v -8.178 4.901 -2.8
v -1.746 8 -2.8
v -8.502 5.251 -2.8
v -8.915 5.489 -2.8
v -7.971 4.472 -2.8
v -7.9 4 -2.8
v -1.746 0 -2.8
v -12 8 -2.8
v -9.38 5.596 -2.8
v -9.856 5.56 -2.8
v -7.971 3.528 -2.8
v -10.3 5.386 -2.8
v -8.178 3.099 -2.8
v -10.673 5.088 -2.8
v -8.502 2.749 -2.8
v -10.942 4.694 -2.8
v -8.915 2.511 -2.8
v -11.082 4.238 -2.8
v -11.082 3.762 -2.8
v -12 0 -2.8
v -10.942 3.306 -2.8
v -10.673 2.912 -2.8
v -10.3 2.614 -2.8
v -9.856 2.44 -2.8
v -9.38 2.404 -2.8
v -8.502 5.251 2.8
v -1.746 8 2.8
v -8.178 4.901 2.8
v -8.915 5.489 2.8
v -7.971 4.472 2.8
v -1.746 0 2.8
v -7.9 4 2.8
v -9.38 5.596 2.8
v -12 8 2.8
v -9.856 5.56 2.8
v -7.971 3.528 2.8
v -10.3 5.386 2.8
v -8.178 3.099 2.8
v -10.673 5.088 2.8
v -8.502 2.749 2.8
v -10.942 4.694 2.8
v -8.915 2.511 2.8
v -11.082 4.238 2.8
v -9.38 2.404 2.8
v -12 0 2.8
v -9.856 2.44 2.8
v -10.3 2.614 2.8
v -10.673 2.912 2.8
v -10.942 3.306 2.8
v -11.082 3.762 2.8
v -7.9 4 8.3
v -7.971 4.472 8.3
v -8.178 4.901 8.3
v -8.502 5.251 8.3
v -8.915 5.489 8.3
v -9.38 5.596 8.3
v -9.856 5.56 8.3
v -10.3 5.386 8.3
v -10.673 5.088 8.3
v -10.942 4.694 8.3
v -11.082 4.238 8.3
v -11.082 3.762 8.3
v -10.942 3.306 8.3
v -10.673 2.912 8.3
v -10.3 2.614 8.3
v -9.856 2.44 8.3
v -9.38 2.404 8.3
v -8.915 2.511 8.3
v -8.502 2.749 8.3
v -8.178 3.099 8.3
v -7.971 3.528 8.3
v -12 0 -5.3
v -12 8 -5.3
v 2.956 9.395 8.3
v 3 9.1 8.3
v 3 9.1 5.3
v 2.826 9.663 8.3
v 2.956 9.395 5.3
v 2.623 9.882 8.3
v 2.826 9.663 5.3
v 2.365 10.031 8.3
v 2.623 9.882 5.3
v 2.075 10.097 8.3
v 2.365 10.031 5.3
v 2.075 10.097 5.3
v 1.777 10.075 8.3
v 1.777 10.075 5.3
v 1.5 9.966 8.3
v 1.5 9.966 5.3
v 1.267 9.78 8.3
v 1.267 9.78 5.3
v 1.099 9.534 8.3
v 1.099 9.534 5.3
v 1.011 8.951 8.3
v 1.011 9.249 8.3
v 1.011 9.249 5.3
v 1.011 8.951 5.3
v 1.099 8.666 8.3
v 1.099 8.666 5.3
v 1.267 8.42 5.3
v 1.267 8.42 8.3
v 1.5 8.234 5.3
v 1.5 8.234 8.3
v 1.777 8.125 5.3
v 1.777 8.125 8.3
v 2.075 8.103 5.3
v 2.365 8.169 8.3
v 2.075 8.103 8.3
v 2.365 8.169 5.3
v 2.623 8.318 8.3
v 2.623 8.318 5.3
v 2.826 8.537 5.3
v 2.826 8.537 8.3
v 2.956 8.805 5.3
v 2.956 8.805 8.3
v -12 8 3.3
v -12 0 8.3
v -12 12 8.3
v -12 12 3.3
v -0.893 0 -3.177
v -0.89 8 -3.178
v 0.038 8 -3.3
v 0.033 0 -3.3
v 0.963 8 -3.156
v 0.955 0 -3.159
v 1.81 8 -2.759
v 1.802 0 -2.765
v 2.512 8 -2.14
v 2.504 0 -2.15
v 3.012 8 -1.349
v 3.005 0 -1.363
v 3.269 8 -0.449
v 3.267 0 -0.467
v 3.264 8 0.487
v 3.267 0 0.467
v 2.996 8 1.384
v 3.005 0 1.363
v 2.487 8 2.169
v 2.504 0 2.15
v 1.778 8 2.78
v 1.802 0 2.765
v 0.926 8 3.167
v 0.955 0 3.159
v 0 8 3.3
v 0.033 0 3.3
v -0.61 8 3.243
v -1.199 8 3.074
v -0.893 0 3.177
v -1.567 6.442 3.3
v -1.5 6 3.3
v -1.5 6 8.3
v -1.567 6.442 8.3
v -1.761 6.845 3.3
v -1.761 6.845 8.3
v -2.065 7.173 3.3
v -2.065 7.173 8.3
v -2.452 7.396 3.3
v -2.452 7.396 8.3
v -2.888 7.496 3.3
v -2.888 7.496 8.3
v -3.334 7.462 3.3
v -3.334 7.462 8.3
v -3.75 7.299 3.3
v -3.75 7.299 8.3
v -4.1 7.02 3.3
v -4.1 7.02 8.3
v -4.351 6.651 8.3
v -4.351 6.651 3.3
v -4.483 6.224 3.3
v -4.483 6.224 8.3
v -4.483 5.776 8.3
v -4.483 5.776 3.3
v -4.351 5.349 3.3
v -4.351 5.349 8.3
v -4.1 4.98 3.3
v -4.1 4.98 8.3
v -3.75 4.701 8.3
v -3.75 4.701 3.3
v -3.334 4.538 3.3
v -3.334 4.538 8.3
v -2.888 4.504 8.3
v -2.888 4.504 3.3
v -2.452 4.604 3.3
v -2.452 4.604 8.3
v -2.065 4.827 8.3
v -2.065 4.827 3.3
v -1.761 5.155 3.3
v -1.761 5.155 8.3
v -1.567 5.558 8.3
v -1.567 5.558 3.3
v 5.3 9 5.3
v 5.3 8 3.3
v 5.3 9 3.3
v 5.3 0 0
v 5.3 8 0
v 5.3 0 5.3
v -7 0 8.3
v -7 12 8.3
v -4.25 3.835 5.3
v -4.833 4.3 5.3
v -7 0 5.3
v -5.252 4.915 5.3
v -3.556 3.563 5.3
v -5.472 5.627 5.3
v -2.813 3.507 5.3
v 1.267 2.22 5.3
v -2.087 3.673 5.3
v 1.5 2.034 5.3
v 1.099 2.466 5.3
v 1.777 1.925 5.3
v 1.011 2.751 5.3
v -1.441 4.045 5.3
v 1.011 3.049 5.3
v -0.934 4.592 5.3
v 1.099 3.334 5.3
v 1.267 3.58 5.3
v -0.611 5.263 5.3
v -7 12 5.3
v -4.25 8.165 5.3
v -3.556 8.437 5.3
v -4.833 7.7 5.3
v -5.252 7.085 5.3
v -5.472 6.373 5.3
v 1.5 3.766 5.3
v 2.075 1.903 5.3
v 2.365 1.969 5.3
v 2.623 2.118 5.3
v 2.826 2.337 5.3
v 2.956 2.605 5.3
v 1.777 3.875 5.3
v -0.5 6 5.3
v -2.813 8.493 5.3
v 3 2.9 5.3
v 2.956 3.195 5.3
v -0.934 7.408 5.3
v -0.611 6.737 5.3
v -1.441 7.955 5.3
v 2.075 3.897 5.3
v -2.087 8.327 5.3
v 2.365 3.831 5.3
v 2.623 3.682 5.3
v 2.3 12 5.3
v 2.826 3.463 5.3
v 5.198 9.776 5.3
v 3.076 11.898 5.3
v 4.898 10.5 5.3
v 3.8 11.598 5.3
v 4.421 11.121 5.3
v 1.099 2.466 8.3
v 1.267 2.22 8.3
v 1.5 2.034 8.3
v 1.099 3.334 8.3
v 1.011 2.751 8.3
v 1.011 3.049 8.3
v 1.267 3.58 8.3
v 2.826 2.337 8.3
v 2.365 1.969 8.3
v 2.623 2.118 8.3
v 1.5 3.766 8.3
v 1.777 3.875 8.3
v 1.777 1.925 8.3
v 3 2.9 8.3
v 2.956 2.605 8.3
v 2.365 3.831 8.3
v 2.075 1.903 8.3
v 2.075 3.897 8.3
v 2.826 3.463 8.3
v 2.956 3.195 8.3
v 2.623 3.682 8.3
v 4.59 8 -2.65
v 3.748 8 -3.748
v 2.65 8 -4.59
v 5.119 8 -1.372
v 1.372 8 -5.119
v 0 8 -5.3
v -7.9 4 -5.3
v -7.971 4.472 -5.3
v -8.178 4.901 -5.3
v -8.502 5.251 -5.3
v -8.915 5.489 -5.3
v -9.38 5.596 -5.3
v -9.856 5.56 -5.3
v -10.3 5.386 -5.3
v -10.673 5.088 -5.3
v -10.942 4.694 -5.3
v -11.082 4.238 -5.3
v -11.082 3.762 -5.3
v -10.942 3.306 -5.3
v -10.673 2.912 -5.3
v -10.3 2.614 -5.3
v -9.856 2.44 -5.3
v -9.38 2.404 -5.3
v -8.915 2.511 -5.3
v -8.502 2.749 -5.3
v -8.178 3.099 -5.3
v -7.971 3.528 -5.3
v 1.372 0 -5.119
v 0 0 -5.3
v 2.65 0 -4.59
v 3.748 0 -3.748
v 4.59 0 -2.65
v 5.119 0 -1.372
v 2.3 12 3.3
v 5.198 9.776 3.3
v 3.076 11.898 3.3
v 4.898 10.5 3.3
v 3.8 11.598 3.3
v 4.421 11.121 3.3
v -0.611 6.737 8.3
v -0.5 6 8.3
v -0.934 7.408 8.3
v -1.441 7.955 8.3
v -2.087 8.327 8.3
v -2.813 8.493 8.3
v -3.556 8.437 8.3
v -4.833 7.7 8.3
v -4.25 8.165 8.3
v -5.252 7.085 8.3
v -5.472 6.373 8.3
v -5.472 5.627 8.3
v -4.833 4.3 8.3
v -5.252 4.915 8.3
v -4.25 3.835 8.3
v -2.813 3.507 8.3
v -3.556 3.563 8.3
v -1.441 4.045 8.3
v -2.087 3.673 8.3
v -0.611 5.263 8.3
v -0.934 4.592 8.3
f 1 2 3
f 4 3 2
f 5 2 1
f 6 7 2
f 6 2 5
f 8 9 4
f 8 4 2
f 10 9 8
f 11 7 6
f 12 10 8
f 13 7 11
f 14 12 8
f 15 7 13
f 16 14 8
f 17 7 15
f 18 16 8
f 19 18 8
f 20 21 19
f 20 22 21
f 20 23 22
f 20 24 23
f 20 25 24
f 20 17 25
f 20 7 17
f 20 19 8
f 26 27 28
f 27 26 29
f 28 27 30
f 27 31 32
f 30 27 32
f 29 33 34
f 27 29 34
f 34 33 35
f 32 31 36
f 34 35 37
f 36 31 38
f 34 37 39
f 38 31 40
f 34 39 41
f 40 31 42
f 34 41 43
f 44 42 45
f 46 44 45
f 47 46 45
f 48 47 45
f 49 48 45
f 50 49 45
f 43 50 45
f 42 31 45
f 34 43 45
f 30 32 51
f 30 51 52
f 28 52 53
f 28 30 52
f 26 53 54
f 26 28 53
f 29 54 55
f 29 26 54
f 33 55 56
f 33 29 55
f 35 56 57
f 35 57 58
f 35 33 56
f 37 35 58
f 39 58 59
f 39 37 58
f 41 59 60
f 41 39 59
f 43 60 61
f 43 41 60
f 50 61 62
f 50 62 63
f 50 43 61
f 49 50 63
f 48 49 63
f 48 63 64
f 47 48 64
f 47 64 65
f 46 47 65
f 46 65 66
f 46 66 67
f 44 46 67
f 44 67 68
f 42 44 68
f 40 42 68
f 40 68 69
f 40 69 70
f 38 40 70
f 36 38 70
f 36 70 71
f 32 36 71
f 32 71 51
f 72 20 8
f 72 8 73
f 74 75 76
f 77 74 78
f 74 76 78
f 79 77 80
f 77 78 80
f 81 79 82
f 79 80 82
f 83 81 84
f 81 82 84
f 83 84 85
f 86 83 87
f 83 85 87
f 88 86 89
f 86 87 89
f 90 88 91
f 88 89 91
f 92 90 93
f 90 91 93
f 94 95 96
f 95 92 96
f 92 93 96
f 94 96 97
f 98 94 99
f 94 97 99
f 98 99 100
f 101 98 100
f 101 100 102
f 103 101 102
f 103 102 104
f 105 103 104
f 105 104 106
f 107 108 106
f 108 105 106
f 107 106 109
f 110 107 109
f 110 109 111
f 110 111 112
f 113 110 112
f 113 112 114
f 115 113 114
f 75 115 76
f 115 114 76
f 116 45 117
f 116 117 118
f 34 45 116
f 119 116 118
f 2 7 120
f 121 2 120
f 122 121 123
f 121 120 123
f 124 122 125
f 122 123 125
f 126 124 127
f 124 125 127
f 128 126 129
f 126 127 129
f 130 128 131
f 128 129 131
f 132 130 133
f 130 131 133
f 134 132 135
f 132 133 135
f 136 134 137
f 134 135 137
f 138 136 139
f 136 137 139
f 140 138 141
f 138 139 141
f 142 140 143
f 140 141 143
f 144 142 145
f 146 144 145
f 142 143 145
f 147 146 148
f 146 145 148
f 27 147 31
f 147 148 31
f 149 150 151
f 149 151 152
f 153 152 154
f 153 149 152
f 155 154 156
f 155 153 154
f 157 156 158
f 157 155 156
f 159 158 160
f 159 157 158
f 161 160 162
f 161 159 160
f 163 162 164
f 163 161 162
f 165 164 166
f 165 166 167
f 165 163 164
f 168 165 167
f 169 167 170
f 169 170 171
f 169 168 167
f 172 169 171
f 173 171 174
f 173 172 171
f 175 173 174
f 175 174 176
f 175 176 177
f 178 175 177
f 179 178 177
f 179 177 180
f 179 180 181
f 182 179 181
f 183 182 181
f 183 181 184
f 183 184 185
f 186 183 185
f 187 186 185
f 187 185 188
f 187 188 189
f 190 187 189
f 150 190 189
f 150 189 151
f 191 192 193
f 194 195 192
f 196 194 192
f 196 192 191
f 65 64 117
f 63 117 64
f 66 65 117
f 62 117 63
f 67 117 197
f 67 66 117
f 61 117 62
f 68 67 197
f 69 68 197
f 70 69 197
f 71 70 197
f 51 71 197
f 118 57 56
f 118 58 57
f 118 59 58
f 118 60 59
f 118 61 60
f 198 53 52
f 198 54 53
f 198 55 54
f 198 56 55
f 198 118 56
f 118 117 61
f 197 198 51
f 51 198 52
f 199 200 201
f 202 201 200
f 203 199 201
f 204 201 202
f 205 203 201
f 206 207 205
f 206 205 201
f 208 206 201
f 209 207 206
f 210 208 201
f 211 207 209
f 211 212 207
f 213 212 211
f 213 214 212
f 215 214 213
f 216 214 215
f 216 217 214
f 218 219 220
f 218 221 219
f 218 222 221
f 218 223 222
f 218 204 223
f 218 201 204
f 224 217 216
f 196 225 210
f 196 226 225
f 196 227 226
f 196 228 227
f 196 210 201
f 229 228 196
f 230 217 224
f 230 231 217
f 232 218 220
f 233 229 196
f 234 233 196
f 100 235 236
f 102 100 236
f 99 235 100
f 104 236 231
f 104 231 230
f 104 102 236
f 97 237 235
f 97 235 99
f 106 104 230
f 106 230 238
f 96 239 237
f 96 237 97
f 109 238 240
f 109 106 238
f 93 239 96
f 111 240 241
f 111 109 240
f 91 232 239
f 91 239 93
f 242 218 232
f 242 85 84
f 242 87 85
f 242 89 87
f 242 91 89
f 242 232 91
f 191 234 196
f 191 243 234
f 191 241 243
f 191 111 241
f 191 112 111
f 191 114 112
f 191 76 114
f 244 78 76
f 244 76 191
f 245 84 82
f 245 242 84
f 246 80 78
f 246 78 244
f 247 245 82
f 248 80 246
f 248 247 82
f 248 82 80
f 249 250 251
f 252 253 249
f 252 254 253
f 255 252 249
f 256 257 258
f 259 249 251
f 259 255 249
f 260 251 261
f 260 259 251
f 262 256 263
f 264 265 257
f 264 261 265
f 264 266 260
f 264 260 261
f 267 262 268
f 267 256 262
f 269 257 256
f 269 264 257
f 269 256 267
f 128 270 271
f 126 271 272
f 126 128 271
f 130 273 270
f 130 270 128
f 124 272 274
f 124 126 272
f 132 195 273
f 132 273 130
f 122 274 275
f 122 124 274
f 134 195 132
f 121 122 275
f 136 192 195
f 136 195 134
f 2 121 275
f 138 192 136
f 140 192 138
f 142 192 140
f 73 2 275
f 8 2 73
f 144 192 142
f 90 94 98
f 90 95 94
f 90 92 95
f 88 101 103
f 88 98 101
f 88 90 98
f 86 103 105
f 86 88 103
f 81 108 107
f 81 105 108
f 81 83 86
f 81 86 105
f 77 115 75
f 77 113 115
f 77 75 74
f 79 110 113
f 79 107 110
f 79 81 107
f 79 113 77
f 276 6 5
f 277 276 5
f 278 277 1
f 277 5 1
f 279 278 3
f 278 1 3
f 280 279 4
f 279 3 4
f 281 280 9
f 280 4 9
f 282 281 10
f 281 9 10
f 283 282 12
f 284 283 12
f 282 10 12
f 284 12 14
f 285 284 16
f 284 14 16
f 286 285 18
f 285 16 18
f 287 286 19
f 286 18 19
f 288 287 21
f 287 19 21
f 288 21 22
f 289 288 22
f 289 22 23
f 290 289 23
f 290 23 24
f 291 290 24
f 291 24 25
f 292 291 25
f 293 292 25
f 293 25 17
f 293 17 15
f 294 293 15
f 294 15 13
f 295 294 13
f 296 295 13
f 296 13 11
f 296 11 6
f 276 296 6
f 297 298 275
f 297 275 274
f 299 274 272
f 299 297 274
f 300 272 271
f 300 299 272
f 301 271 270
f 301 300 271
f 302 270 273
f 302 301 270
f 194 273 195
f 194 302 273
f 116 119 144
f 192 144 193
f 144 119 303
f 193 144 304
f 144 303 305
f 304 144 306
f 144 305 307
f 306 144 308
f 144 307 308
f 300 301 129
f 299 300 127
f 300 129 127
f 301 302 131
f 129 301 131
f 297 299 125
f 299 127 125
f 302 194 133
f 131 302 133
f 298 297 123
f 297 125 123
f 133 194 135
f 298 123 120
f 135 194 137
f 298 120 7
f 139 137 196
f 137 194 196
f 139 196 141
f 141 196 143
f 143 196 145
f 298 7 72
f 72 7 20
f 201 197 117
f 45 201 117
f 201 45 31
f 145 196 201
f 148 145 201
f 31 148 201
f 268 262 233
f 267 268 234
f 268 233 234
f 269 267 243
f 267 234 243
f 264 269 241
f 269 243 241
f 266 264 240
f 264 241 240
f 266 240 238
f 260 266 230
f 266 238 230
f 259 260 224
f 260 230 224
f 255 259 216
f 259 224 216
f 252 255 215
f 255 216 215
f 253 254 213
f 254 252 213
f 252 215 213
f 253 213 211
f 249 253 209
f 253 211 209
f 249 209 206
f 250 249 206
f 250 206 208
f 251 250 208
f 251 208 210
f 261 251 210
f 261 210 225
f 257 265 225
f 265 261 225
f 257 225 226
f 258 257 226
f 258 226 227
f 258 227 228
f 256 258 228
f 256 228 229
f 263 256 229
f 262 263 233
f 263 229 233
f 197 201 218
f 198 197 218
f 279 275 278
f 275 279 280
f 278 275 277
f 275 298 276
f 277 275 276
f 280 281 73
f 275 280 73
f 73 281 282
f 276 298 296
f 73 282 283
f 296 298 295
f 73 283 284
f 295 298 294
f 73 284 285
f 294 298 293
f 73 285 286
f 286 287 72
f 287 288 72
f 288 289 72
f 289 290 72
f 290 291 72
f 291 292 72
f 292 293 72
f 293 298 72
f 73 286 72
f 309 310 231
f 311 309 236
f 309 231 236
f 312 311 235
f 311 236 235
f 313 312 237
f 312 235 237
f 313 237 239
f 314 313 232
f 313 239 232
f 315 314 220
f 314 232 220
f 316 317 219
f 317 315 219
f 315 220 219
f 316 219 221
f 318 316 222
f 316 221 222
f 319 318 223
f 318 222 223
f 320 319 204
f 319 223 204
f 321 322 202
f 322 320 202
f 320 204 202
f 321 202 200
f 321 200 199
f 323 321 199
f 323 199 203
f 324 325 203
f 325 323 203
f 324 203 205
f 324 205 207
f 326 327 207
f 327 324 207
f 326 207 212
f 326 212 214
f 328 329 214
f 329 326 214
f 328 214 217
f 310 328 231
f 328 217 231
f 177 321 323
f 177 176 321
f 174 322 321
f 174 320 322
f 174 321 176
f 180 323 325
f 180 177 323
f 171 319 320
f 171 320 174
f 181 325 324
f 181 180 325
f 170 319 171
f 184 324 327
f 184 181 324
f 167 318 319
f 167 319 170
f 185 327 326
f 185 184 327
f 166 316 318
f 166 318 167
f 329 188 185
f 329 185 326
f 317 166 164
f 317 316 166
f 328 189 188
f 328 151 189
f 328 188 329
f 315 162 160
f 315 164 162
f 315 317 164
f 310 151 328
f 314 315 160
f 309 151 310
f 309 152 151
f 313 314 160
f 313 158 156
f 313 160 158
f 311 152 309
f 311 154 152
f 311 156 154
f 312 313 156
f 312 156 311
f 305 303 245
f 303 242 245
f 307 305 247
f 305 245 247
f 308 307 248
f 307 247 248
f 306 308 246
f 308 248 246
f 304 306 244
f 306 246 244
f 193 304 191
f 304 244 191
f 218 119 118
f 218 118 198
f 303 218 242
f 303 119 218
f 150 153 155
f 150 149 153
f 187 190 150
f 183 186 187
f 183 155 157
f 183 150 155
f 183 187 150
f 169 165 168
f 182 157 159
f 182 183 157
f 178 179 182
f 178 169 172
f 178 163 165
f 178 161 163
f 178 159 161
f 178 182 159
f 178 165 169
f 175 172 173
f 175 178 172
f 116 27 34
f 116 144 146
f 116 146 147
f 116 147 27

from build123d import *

# Parameters (mm, degrees)
PAD001_DEPTH         = 8
SKETCH004_R          = 1.6
POCKET001_DEPTH      = 5.301
POCKET001_DEPTH_BACK = 3.3011
SKETCH_W             = 17.3
SKETCH_H             = 12
SKETCH_R             = 1.5
SKETCH_R_2           = 1.6
PAD_DEPTH            = 5
SKETCH001_W          = 14
SKETCH001_H          = 12
SKETCH001_R          = 2.5
SKETCH001_R_2        = 1
POCKET_DEPTH         = 3.001
FILLET_R             = 3


with BuildPart() as clipbody:
    # Sketch003 → Pad001 (new body)
    with BuildSketch(Plane.XZ):
        with BuildLine():
            Line((0, -5.3), (-12, -5.3))
            Line((-12, -2.8), (-12, -5.3))
            Line((-1.746425, -2.8), (-12, -2.8))
            ThreePointArc((-1.746425, -2.8), (3.3, 0), (-1.746425, 2.8))
            Line((-1.746425, 2.8), (-12, 2.8))
            Line((-12, 2.8), (-12, 3.3001))
            Line((5.3, 3.3001), (-12, 3.3001))
            Line((5.3, 0), (5.3, 3.3001))
            ThreePointArc((0, -5.3), (3.747666, -3.747666), (5.3, 0))
        make_face()
    extrude(amount=-PAD001_DEPTH)

    # Sketch004 → Pocket001 (cut, two sides)
    with BuildSketch(Plane.XY) as pocket001_sk:
        with Locations((-9.5, 4)):
            Circle(SKETCH004_R)
    extrude(amount=-POCKET001_DEPTH, mode=Mode.SUBTRACT)
    extrude(pocket001_sk.sketch, amount=POCKET001_DEPTH_BACK, mode=Mode.SUBTRACT)


with BuildPart() as part_refined:
    # Sketch → Pad (new body)
    with BuildSketch(Plane.XY):
        with Locations((8.65, 6)):
            Rectangle(SKETCH_W, SKETCH_H)
        with Locations((9, 6)):
            Circle(SKETCH_R, mode=Mode.SUBTRACT)
        with Locations((2.5, 4)):
            Circle(SKETCH_R_2, mode=Mode.SUBTRACT)
    extrude(amount=PAD_DEPTH)

    # Sketch001 (on DatumPlane) → Pocket (cut, through all)
    with BuildSketch(Plane.XY.offset(2)):
        with Locations((12, 6)):
            Rectangle(SKETCH001_W, SKETCH001_H)
        with Locations((9, 6)):
            Circle(SKETCH001_R, mode=Mode.SUBTRACT)
        with Locations((14, 9.1)):
            Circle(SKETCH001_R_2, mode=Mode.SUBTRACT)
        with Locations((14, 2.9)):
            Circle(SKETCH001_R_2, mode=Mode.SUBTRACT)
    extrude(amount=POCKET_DEPTH, mode=Mode.SUBTRACT)

    # Fillet
    fillet_edges = [part_refined.edges().sort_by_distance(p)[0] for p in [
        (17.3, 12, 1),
    ]]
    fillet(fillet_edges, radius=FILLET_R)


with BuildPart() as part_refined_1:
    # Body placement: moved
    add(part_refined.part.moved(Location((-12, 0, 3.3))))

    # Fusion: union ClipBody
    add(clipbody.part)


solid = part_refined_1.part
